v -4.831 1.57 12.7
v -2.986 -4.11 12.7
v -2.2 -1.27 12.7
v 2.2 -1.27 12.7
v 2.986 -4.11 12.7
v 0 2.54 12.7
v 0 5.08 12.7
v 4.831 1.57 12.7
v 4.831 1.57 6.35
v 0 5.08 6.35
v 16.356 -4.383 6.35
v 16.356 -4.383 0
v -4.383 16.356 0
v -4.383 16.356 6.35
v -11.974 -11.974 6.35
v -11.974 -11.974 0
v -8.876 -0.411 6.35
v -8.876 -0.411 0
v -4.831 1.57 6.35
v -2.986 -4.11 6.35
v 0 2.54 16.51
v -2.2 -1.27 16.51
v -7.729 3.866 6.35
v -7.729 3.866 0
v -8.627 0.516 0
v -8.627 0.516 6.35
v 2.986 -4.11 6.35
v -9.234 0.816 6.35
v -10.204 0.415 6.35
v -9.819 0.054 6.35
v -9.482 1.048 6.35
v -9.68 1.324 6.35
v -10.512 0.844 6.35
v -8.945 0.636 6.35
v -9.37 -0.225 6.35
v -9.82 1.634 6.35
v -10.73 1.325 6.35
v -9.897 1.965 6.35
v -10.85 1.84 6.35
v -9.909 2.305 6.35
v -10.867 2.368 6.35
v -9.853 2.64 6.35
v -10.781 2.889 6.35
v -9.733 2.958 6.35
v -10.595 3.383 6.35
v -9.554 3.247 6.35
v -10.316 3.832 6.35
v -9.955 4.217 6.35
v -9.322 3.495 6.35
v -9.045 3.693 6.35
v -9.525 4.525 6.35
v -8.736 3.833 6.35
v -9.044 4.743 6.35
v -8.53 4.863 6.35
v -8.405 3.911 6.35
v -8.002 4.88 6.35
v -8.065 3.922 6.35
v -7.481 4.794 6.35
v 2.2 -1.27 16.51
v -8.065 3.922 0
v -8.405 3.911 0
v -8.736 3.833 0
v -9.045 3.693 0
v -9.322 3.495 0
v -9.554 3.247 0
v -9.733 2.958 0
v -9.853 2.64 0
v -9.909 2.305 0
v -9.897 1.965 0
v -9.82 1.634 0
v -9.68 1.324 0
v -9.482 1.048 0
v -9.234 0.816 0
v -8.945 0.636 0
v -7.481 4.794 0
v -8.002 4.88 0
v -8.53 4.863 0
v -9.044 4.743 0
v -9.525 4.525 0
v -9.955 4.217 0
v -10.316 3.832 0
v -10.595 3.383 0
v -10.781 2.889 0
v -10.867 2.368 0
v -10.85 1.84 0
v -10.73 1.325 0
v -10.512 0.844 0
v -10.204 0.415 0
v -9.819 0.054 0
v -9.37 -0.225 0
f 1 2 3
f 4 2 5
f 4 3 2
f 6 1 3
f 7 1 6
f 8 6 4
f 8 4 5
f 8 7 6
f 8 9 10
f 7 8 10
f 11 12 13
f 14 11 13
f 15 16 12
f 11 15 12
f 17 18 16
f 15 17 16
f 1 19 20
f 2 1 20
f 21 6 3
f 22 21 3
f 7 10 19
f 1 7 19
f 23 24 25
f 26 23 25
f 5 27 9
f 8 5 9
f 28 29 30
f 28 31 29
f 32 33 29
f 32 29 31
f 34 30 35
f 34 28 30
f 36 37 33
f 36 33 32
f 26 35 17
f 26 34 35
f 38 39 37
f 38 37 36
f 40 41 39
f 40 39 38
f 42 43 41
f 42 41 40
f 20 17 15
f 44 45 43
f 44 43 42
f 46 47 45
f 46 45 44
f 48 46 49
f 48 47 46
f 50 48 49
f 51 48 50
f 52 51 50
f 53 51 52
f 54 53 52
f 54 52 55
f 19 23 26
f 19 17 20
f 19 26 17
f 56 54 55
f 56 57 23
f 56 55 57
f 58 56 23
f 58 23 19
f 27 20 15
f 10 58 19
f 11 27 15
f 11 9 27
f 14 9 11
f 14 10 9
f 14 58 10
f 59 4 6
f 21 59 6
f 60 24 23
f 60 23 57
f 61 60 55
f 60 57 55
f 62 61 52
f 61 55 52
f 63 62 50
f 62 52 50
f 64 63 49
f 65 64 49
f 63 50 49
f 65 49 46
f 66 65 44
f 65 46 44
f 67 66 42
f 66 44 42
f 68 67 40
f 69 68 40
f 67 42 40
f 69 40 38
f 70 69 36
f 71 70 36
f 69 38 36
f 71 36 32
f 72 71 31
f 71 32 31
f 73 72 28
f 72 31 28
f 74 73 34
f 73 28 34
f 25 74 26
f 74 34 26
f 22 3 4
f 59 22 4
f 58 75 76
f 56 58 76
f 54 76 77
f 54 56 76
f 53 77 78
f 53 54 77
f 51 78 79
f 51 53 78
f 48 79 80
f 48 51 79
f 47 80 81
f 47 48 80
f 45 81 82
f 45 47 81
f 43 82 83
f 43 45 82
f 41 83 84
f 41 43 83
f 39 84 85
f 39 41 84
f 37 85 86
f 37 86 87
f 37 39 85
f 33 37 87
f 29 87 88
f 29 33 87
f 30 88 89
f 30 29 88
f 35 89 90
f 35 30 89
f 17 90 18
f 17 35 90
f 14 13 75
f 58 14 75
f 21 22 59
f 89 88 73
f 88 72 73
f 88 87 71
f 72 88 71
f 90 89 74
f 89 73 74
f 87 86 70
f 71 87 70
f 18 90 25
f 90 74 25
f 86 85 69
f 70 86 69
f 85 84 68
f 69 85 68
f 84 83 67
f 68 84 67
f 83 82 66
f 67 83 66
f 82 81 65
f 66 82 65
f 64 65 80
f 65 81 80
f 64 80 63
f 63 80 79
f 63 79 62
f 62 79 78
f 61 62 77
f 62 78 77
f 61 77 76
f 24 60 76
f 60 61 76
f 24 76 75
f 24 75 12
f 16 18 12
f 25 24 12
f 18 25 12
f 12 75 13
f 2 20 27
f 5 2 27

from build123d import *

# Parameters (mm, degrees)
F1_DEPTH = 6.35
F3_DEPTH = 6.35
F5_DEPTH = 3.81
F6_R     = 2.694583
F6_R_2   = 1.7341
F7_DEPTH = 6.35


with BuildPart() as f1:
    # F0 (on Top) → F1 (new body)
    with BuildSketch(Plane.XY):
        Polygon((16.356344, -4.382671), (-4.382668, 16.356344), (-11.973676, -11.973674), align=None)
    extrude(amount=F1_DEPTH)

    # F2 (on face) → F3 (join)
    with BuildSketch(Plane.XY.offset(6.35)):
        Polygon((-2.985949, -4.109806), (2.985949, -4.109806), (4.831367, 1.569806), (0, 5.08), (-4.831367, 1.569806), align=None)
    extrude(amount=F3_DEPTH)

    # F4 (on face) → F5 (join)
    with BuildSketch(Plane.XY.offset(12.7)):
        Polygon((-2.199705, -1.27), (2.199705, -1.27), (0, 2.54), align=None)
    extrude(amount=F5_DEPTH)

    # F6 (on face) → F7 (join)
    with BuildSketch(Plane.XY.offset(6.35)):
        with Locations((-8.178172, 2.191335)):
            Circle(F6_R)
        with Locations((-8.178172, 2.191335)):
            Circle(F6_R_2, mode=Mode.SUBTRACT)
    extrude(amount=-F7_DEPTH)


solid = f1.part
